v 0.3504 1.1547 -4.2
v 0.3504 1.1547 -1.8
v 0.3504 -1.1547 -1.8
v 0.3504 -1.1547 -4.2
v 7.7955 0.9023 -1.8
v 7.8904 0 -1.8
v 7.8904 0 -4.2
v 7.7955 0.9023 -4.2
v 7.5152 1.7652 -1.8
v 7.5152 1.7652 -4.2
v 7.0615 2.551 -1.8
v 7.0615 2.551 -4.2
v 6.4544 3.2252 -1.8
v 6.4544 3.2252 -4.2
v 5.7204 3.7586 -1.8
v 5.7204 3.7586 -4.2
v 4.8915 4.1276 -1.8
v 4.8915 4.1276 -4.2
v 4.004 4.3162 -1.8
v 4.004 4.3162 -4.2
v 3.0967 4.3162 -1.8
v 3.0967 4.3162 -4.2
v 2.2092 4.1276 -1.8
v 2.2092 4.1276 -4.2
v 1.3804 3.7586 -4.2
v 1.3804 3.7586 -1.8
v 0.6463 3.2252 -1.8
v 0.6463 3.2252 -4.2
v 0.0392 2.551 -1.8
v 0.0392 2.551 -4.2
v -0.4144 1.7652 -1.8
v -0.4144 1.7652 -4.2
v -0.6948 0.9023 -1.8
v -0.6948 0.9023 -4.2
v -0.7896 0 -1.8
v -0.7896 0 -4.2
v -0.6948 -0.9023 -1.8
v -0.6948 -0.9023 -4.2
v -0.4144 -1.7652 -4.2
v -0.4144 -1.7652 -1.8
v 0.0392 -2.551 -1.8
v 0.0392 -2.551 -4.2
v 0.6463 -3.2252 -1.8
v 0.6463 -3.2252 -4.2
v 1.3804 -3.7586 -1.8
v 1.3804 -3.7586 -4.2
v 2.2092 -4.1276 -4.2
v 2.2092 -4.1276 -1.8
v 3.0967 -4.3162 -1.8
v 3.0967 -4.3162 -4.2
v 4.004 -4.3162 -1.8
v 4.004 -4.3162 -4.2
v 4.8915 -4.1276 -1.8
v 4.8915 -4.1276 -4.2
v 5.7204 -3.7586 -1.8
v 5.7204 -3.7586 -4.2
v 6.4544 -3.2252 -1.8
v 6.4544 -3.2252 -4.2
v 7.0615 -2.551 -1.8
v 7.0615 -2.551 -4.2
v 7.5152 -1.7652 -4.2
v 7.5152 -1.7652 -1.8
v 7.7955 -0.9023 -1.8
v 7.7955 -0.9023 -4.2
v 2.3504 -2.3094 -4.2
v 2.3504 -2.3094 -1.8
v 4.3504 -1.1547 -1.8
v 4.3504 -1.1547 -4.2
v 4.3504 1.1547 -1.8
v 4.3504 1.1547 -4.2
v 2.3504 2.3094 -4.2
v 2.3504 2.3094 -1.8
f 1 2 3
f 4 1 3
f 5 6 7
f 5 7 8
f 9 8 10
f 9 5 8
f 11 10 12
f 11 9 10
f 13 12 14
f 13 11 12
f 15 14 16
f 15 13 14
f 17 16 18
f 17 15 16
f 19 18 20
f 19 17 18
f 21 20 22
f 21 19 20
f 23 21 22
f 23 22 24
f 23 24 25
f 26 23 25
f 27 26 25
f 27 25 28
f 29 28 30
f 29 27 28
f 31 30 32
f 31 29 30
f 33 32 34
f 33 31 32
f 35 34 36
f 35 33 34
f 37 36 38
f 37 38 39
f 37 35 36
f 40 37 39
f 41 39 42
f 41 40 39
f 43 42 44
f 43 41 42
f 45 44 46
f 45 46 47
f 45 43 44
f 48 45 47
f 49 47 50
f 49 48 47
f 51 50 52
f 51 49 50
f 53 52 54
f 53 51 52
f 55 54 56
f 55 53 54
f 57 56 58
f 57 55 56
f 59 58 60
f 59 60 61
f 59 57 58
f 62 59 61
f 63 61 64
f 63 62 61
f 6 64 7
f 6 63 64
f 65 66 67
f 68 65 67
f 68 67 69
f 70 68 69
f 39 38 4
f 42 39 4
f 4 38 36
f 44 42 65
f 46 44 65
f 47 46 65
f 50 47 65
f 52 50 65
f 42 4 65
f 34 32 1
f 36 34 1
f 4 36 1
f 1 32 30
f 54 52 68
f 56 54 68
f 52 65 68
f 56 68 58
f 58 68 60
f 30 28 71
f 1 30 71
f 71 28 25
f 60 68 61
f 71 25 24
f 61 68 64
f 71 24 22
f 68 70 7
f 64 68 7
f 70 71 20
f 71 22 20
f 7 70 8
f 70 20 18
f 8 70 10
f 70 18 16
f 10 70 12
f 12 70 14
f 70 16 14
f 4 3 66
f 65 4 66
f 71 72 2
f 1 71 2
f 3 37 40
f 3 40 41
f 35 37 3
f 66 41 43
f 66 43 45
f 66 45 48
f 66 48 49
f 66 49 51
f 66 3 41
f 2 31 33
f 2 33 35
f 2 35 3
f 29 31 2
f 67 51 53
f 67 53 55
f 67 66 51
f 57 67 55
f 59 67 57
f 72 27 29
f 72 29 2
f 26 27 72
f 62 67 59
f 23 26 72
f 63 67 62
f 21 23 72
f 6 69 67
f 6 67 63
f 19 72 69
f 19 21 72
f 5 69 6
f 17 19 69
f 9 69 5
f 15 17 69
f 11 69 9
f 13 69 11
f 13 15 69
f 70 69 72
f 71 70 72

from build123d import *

# Parameters (mm, degrees)
SKETCH1_R           = 10.85
BOSS_EXTRUDE1_DEPTH = 6
SCALE1_SCALE        = 0.4


with BuildPart() as part:
    # Sketch1 → Boss-Extrude1 (new body)
    with BuildSketch(Plane.XY):
        with Locations((3, 0)):
            Circle(SKETCH1_R)
        Polygon((0, 5.773502692), (-5, 2.886751346), (-5, -2.886751346), (0, -5.773502692), (5, -2.886751346), (5, 2.886751346), align=None, mode=Mode.SUBTRACT)
    extrude(amount=-BOSS_EXTRUDE1_DEPTH)


with BuildPart() as part_1:
    # Scale1: scaled about (3.917290958, 0, -3)
    add(part.part.scale(SCALE1_SCALE).moved(Location((2.350374575, 0, -1.8))))


solid = part_1.part
